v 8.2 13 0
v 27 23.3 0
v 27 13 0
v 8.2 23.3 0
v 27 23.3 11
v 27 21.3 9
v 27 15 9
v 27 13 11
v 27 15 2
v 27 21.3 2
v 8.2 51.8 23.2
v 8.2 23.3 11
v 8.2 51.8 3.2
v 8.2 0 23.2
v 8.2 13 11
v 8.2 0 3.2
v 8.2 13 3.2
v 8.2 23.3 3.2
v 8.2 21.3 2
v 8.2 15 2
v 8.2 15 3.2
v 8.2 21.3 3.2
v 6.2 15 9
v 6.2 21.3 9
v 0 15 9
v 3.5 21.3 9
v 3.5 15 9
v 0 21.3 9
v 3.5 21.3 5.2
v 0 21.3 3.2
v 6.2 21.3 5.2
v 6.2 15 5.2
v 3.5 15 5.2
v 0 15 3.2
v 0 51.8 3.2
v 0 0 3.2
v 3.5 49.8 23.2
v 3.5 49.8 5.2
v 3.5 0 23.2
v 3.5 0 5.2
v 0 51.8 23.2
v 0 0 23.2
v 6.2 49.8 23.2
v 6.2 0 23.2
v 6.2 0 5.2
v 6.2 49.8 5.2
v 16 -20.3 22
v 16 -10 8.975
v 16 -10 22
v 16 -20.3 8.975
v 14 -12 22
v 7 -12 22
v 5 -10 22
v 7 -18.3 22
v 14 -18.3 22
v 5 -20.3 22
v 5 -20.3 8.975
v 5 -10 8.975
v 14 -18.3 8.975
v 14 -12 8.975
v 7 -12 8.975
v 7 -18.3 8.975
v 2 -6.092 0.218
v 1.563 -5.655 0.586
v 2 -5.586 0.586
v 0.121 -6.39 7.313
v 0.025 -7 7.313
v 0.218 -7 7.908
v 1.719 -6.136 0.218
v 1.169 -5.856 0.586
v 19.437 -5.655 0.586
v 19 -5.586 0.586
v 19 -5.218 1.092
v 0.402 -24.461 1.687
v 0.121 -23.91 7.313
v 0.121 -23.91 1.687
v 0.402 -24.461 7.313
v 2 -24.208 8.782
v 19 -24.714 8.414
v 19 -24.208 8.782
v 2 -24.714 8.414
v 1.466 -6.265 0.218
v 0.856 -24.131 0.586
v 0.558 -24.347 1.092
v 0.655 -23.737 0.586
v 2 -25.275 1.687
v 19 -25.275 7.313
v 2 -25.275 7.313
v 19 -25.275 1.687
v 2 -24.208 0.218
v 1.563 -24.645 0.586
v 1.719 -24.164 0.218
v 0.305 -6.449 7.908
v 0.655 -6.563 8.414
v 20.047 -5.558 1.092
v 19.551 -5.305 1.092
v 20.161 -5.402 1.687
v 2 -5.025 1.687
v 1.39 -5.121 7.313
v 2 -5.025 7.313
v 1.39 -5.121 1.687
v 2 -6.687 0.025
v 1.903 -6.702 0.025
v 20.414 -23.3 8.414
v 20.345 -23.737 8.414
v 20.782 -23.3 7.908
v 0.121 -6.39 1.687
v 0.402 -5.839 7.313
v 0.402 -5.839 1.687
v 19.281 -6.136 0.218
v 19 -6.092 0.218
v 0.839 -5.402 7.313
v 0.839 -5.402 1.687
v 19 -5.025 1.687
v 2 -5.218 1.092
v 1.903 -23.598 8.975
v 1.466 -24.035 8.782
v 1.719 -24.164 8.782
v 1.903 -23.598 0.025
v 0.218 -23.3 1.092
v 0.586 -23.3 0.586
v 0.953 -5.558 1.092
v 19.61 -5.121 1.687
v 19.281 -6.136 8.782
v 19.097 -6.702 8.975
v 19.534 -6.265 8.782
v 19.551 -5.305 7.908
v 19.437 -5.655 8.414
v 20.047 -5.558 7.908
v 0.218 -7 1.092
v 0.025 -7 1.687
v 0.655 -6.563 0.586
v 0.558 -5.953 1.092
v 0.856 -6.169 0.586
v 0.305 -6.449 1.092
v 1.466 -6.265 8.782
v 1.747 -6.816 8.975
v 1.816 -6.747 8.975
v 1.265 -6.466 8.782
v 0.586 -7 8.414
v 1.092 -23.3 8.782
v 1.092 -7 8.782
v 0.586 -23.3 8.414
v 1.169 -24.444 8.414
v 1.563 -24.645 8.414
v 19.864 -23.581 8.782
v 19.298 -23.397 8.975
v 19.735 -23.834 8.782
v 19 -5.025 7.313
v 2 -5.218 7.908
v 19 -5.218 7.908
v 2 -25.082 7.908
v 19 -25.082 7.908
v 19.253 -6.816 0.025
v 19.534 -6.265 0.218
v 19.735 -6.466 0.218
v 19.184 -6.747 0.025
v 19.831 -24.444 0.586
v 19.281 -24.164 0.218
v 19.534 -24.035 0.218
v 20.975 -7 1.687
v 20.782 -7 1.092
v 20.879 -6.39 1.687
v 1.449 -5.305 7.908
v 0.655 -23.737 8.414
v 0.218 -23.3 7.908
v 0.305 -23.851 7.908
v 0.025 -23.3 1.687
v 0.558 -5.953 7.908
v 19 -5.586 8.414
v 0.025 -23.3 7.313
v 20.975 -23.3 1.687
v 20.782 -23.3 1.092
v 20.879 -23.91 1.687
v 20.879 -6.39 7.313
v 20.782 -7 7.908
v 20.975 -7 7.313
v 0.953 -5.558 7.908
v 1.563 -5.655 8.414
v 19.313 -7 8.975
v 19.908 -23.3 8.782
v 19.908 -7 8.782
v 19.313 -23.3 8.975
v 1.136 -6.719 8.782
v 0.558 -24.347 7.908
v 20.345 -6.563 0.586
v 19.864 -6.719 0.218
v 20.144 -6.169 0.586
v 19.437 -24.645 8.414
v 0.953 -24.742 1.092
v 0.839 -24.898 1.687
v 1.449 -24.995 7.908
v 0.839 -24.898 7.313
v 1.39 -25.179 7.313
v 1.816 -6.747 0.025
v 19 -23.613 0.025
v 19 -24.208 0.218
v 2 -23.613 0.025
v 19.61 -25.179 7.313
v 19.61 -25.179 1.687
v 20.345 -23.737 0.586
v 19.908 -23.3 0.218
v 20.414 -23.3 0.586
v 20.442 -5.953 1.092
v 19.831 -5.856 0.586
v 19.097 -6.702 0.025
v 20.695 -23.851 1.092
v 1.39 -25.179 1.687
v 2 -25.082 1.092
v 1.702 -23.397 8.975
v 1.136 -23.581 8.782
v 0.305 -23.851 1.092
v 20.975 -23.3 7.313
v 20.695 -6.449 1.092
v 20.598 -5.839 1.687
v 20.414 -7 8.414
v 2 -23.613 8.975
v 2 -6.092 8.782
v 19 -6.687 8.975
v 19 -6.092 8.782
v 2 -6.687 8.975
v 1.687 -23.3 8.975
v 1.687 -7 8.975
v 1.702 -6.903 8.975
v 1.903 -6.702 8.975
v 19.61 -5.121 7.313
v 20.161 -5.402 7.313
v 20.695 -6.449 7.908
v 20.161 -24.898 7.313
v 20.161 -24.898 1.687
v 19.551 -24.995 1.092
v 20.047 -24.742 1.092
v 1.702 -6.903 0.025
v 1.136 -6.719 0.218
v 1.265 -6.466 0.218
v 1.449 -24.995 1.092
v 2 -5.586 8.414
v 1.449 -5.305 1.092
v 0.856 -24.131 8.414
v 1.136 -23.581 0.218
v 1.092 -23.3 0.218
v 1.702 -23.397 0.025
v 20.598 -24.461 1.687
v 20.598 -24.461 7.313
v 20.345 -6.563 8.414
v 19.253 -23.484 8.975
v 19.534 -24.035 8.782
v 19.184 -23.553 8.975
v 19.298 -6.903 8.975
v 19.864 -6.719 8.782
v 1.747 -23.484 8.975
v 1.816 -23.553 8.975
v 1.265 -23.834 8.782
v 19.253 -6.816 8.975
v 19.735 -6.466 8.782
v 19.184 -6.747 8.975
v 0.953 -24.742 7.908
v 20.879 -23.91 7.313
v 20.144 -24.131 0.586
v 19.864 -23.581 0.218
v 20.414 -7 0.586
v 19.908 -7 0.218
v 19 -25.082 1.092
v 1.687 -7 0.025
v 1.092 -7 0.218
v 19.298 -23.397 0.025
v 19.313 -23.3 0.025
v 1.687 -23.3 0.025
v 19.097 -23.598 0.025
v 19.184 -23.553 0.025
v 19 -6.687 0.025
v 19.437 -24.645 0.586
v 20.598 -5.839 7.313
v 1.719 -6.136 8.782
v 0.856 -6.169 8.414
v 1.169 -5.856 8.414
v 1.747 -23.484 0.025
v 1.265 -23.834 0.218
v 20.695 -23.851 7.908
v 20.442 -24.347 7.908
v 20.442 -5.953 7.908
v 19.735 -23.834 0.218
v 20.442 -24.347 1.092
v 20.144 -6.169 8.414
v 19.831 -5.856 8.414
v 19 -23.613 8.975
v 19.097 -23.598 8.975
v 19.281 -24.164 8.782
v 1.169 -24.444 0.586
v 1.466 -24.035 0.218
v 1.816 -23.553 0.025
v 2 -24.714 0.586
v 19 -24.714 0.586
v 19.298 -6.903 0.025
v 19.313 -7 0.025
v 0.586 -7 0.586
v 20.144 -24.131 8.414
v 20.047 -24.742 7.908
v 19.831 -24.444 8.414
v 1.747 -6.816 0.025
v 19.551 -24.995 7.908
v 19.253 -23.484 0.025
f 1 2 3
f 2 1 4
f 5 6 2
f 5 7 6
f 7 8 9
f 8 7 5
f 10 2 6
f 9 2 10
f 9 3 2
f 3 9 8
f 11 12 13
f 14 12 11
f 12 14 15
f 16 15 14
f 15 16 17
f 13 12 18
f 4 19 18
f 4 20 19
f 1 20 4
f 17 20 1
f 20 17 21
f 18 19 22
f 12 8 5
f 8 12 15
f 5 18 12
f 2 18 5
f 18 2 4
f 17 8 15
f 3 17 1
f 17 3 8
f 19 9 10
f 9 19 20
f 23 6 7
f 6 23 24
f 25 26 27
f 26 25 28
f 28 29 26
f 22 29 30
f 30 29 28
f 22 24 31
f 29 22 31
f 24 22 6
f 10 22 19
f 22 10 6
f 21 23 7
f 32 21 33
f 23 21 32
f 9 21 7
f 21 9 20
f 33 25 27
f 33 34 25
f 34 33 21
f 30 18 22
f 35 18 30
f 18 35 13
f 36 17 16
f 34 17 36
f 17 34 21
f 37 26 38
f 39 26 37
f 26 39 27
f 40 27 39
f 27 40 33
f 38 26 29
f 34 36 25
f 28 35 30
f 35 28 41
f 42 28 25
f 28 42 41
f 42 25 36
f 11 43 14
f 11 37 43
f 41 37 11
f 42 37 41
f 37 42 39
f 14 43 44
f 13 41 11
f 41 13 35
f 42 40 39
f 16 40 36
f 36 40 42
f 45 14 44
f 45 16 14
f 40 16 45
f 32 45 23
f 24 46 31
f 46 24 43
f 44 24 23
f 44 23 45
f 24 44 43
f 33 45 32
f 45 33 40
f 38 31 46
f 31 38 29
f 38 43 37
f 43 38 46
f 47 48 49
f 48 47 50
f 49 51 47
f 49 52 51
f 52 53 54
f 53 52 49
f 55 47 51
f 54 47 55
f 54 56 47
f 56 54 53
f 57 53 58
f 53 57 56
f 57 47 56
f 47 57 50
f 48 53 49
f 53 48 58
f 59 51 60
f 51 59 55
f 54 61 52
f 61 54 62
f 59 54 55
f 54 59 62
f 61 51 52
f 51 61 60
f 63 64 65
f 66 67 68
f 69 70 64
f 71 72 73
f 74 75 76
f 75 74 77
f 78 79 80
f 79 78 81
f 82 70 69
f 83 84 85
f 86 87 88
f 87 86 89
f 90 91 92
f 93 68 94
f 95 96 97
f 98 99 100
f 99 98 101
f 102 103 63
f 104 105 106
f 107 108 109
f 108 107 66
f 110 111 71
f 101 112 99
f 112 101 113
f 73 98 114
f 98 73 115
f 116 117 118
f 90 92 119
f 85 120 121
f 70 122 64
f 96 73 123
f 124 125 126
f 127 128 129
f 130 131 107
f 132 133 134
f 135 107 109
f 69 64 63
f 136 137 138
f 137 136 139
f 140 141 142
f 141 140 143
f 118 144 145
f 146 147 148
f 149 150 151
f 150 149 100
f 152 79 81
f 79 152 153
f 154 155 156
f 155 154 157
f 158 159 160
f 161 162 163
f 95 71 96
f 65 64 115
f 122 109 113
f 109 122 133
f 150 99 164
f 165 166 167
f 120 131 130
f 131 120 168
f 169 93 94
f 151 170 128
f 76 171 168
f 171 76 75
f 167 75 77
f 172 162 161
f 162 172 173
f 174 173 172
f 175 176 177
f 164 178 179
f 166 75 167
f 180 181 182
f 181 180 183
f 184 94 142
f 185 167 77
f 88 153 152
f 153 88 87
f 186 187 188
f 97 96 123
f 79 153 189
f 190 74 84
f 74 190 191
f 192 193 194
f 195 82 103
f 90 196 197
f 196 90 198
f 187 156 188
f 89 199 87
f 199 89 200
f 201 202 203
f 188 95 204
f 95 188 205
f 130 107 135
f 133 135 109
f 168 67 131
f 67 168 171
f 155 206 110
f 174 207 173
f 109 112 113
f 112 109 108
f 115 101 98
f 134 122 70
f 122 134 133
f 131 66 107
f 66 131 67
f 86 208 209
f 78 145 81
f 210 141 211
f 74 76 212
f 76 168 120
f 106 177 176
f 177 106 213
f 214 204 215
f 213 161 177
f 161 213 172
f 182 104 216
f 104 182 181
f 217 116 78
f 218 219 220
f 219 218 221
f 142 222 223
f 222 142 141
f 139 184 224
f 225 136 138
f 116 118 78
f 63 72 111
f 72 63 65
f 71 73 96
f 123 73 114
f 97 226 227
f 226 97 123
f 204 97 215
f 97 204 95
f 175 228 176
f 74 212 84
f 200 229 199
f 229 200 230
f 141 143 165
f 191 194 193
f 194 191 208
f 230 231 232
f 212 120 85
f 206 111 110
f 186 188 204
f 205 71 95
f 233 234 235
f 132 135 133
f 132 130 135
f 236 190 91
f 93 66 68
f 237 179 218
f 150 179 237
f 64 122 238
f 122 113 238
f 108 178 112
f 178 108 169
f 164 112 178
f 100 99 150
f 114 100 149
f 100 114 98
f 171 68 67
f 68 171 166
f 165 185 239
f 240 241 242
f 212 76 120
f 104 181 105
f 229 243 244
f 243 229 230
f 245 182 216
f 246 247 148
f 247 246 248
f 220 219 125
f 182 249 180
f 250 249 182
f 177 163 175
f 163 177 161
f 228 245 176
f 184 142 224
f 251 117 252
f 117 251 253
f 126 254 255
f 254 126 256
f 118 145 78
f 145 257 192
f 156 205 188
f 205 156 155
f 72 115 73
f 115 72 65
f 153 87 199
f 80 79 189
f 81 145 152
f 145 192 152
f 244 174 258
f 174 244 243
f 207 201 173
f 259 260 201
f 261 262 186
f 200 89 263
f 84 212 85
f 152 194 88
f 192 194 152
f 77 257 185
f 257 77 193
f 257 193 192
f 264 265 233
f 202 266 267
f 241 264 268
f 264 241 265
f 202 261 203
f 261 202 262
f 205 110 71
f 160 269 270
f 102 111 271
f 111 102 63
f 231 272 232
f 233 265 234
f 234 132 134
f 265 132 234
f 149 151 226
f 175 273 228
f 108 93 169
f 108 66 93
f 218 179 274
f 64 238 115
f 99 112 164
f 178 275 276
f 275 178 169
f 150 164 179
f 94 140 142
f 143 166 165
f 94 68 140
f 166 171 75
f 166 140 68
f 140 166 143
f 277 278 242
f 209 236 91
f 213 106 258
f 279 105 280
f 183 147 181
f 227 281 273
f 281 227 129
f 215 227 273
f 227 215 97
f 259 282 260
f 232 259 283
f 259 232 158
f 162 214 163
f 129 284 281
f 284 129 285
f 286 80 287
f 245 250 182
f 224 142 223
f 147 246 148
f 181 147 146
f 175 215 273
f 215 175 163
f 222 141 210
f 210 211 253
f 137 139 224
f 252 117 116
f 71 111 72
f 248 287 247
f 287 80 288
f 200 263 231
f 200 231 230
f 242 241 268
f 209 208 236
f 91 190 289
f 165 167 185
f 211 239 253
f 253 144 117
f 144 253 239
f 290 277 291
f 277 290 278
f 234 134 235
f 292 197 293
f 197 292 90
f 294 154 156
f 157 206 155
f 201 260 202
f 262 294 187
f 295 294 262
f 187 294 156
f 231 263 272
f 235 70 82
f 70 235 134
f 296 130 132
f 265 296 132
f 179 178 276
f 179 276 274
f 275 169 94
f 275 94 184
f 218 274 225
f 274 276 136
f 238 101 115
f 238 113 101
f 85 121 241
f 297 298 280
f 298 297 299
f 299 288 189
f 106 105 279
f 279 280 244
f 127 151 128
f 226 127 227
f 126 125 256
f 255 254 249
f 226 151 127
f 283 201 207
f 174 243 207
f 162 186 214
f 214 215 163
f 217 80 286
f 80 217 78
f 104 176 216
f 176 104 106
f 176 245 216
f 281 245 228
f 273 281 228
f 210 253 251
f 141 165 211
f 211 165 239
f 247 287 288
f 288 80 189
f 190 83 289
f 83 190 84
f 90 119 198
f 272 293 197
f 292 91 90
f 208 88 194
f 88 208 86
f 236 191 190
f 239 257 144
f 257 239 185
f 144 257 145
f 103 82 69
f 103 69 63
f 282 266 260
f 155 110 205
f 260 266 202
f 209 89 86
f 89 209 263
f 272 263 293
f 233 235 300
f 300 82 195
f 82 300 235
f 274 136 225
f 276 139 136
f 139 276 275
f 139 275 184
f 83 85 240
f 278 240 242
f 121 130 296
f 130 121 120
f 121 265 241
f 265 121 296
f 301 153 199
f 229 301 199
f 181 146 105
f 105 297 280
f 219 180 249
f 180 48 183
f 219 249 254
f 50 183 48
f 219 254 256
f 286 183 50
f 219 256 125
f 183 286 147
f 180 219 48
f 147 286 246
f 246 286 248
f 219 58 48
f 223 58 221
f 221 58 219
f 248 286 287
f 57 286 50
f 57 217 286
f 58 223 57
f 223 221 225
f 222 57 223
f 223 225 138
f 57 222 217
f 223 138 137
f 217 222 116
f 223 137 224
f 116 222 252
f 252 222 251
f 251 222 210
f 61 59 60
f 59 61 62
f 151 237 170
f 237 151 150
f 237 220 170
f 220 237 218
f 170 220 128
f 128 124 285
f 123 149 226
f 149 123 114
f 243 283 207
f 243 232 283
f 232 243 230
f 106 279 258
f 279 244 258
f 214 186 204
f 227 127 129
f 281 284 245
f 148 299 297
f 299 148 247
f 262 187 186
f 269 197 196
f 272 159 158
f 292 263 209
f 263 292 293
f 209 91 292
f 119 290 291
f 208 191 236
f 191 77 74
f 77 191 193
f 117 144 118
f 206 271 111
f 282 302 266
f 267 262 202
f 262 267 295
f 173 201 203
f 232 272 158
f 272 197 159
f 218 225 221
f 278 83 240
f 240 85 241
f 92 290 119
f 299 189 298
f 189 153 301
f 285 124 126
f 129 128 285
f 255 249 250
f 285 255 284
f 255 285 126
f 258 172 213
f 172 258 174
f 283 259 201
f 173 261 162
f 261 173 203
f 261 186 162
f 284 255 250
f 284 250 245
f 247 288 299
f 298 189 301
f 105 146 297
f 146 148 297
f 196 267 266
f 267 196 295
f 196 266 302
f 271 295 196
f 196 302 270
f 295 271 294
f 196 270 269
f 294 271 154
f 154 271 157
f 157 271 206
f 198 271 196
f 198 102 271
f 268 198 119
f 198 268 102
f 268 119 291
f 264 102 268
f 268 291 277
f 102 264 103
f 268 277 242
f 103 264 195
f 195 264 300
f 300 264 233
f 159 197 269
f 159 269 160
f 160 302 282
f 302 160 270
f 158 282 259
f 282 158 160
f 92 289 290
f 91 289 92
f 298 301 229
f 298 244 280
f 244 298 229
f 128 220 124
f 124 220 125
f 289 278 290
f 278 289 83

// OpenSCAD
// https://web.archive.org/web/20190603181532/http://www.ecma-international.org/publications/files/ECMA-ST-WITHDRAWN/ECMA-66,%201st%20Edition,%20September%201980.pdf

delta=0.01;

in2mm=25.4;

floppy_xy=133.3; // 133.3 ± 0.4 (5.25")
floppy_z=2.2; // 1.2 … 2.1

notch_inset=3.8; // 3.8 ± 0.2
notch_pos1=96.5; // 96.5 ± 0.2
notch_pos2=102.8; // 102.8 ± 0.2
notch_w=notch_pos2-notch_pos1; // 1/4"

tool_x=20;
tool_y=floppy_xy-notch_pos1+15;

bottom_plate_z=4;
top_plate_z=2;

wall=2;

punch_l=41;
punch_x=7;
punch_y=notch_w;
punch_min_z=1;

punch_head_l=15;
punch_head_lid_z=5;
punch_head_lid_overhang=3;
punch_head_lid_r=2;

stack_l=punch_l-bottom_plate_z-floppy_z-top_plate_z+punch_min_z-punch_head_l;

metal_z=.5;

shaft_overhang=punch_x-notch_inset;

explode=2;
print_d=5;

module tool_block(print) {
    // Base plate.
    cube([tool_x, tool_y, bottom_plate_z-metal_z]);

    if (!print) {
        // Metal insert.
    %   difference() {
            translate([0,0,bottom_plate_z-metal_z+delta])
            cube([tool_x-wall-delta, tool_y-wall-delta, metal_z-delta]);

            translate([tool_x-notch_inset-wall, notch_pos1-floppy_xy+tool_y, -delta])
            cube([notch_inset+wall+delta, notch_w, bottom_plate_z+floppy_z+top_plate_z+2*delta]);
        }
    }

    // Walls.
    translate([tool_x-wall, 0, bottom_plate_z-metal_z])
    cube([wall, tool_y, floppy_z+metal_z]);

    translate([0, tool_y-wall, bottom_plate_z-metal_z])
    cube([tool_x, wall, floppy_z+metal_z]);

    // Top plate.
    translate([0, 0, bottom_plate_z+floppy_z])
    cube([tool_x, tool_y, top_plate_z]);

    //Stack.
    difference() {
        translate([tool_x-notch_inset-2*wall, notch_pos1-floppy_xy+tool_y-wall, bottom_plate_z+floppy_z+top_plate_z])
        cube([punch_x+2*wall, punch_y+2*wall, stack_l]);

        translate([tool_x-notch_inset-wall, notch_pos1-floppy_xy+tool_y, bottom_plate_z+floppy_z+top_plate_z-delta])
        cube([punch_x, punch_y, stack_l+2*delta]);
    }
}


module tool(print) {
    difference() {
        tool_block(print);

        // Cut out for punch.
        translate([tool_x-notch_inset-wall, notch_pos1-floppy_xy+tool_y, -delta])
        cube([notch_inset+wall+delta, notch_w, bottom_plate_z+floppy_z+top_plate_z+2*delta]);
    }
}

module punch() {
    #difference() {
        cube([punch_x, punch_y, punch_l]);

        rotate([0, -20, 0])
        translate([-punch_x/2, -punch_y/2, -4])
            cube([punch_x*2, punch_y*2, 4]);
    }
}

module punch_head() {
    union() {
        difference() {
            // Shaft.
            cube([punch_x+2*wall, punch_y+2*wall, punch_head_l]);

            // Remove.
            translate([wall, wall, -delta])
            cube([punch_x, punch_y, stack_l+2*delta]);
        }

        // Head.
        translate([-punch_head_lid_overhang, -punch_head_lid_overhang, punch_head_l])
        minkowski($fn=20) {
            cube([punch_x+2*wall+2*punch_head_lid_overhang, punch_y+2*wall+2*punch_head_lid_overhang, punch_head_lid_z]);
            sphere(punch_head_lid_r);
        }
    }
}

module everything(print) {
    if (print) {
        translate([0, 0, tool_x+shaft_overhang])
        rotate([0, 90, 0])
        tool(print);

        translate([0, -print_d, 0])
        translate([punch_head_lid_overhang+punch_head_lid_r, -punch_head_lid_overhang-punch_head_lid_r, punch_head_l+punch_head_lid_z+punch_head_lid_r])
        rotate([180,0,0])
        punch_head();
    } else {
        tool(print);

        translate([tool_x-notch_inset-wall, notch_pos1-floppy_xy+tool_y, punch_min_z])
        punch();

        translate([0,0,explode])
        translate([tool_x-notch_inset-2*wall, notch_pos1-floppy_xy+tool_y-wall, bottom_plate_z+floppy_z+top_plate_z+stack_l])
        punch_head();
    }
}

everything(print=!false);
